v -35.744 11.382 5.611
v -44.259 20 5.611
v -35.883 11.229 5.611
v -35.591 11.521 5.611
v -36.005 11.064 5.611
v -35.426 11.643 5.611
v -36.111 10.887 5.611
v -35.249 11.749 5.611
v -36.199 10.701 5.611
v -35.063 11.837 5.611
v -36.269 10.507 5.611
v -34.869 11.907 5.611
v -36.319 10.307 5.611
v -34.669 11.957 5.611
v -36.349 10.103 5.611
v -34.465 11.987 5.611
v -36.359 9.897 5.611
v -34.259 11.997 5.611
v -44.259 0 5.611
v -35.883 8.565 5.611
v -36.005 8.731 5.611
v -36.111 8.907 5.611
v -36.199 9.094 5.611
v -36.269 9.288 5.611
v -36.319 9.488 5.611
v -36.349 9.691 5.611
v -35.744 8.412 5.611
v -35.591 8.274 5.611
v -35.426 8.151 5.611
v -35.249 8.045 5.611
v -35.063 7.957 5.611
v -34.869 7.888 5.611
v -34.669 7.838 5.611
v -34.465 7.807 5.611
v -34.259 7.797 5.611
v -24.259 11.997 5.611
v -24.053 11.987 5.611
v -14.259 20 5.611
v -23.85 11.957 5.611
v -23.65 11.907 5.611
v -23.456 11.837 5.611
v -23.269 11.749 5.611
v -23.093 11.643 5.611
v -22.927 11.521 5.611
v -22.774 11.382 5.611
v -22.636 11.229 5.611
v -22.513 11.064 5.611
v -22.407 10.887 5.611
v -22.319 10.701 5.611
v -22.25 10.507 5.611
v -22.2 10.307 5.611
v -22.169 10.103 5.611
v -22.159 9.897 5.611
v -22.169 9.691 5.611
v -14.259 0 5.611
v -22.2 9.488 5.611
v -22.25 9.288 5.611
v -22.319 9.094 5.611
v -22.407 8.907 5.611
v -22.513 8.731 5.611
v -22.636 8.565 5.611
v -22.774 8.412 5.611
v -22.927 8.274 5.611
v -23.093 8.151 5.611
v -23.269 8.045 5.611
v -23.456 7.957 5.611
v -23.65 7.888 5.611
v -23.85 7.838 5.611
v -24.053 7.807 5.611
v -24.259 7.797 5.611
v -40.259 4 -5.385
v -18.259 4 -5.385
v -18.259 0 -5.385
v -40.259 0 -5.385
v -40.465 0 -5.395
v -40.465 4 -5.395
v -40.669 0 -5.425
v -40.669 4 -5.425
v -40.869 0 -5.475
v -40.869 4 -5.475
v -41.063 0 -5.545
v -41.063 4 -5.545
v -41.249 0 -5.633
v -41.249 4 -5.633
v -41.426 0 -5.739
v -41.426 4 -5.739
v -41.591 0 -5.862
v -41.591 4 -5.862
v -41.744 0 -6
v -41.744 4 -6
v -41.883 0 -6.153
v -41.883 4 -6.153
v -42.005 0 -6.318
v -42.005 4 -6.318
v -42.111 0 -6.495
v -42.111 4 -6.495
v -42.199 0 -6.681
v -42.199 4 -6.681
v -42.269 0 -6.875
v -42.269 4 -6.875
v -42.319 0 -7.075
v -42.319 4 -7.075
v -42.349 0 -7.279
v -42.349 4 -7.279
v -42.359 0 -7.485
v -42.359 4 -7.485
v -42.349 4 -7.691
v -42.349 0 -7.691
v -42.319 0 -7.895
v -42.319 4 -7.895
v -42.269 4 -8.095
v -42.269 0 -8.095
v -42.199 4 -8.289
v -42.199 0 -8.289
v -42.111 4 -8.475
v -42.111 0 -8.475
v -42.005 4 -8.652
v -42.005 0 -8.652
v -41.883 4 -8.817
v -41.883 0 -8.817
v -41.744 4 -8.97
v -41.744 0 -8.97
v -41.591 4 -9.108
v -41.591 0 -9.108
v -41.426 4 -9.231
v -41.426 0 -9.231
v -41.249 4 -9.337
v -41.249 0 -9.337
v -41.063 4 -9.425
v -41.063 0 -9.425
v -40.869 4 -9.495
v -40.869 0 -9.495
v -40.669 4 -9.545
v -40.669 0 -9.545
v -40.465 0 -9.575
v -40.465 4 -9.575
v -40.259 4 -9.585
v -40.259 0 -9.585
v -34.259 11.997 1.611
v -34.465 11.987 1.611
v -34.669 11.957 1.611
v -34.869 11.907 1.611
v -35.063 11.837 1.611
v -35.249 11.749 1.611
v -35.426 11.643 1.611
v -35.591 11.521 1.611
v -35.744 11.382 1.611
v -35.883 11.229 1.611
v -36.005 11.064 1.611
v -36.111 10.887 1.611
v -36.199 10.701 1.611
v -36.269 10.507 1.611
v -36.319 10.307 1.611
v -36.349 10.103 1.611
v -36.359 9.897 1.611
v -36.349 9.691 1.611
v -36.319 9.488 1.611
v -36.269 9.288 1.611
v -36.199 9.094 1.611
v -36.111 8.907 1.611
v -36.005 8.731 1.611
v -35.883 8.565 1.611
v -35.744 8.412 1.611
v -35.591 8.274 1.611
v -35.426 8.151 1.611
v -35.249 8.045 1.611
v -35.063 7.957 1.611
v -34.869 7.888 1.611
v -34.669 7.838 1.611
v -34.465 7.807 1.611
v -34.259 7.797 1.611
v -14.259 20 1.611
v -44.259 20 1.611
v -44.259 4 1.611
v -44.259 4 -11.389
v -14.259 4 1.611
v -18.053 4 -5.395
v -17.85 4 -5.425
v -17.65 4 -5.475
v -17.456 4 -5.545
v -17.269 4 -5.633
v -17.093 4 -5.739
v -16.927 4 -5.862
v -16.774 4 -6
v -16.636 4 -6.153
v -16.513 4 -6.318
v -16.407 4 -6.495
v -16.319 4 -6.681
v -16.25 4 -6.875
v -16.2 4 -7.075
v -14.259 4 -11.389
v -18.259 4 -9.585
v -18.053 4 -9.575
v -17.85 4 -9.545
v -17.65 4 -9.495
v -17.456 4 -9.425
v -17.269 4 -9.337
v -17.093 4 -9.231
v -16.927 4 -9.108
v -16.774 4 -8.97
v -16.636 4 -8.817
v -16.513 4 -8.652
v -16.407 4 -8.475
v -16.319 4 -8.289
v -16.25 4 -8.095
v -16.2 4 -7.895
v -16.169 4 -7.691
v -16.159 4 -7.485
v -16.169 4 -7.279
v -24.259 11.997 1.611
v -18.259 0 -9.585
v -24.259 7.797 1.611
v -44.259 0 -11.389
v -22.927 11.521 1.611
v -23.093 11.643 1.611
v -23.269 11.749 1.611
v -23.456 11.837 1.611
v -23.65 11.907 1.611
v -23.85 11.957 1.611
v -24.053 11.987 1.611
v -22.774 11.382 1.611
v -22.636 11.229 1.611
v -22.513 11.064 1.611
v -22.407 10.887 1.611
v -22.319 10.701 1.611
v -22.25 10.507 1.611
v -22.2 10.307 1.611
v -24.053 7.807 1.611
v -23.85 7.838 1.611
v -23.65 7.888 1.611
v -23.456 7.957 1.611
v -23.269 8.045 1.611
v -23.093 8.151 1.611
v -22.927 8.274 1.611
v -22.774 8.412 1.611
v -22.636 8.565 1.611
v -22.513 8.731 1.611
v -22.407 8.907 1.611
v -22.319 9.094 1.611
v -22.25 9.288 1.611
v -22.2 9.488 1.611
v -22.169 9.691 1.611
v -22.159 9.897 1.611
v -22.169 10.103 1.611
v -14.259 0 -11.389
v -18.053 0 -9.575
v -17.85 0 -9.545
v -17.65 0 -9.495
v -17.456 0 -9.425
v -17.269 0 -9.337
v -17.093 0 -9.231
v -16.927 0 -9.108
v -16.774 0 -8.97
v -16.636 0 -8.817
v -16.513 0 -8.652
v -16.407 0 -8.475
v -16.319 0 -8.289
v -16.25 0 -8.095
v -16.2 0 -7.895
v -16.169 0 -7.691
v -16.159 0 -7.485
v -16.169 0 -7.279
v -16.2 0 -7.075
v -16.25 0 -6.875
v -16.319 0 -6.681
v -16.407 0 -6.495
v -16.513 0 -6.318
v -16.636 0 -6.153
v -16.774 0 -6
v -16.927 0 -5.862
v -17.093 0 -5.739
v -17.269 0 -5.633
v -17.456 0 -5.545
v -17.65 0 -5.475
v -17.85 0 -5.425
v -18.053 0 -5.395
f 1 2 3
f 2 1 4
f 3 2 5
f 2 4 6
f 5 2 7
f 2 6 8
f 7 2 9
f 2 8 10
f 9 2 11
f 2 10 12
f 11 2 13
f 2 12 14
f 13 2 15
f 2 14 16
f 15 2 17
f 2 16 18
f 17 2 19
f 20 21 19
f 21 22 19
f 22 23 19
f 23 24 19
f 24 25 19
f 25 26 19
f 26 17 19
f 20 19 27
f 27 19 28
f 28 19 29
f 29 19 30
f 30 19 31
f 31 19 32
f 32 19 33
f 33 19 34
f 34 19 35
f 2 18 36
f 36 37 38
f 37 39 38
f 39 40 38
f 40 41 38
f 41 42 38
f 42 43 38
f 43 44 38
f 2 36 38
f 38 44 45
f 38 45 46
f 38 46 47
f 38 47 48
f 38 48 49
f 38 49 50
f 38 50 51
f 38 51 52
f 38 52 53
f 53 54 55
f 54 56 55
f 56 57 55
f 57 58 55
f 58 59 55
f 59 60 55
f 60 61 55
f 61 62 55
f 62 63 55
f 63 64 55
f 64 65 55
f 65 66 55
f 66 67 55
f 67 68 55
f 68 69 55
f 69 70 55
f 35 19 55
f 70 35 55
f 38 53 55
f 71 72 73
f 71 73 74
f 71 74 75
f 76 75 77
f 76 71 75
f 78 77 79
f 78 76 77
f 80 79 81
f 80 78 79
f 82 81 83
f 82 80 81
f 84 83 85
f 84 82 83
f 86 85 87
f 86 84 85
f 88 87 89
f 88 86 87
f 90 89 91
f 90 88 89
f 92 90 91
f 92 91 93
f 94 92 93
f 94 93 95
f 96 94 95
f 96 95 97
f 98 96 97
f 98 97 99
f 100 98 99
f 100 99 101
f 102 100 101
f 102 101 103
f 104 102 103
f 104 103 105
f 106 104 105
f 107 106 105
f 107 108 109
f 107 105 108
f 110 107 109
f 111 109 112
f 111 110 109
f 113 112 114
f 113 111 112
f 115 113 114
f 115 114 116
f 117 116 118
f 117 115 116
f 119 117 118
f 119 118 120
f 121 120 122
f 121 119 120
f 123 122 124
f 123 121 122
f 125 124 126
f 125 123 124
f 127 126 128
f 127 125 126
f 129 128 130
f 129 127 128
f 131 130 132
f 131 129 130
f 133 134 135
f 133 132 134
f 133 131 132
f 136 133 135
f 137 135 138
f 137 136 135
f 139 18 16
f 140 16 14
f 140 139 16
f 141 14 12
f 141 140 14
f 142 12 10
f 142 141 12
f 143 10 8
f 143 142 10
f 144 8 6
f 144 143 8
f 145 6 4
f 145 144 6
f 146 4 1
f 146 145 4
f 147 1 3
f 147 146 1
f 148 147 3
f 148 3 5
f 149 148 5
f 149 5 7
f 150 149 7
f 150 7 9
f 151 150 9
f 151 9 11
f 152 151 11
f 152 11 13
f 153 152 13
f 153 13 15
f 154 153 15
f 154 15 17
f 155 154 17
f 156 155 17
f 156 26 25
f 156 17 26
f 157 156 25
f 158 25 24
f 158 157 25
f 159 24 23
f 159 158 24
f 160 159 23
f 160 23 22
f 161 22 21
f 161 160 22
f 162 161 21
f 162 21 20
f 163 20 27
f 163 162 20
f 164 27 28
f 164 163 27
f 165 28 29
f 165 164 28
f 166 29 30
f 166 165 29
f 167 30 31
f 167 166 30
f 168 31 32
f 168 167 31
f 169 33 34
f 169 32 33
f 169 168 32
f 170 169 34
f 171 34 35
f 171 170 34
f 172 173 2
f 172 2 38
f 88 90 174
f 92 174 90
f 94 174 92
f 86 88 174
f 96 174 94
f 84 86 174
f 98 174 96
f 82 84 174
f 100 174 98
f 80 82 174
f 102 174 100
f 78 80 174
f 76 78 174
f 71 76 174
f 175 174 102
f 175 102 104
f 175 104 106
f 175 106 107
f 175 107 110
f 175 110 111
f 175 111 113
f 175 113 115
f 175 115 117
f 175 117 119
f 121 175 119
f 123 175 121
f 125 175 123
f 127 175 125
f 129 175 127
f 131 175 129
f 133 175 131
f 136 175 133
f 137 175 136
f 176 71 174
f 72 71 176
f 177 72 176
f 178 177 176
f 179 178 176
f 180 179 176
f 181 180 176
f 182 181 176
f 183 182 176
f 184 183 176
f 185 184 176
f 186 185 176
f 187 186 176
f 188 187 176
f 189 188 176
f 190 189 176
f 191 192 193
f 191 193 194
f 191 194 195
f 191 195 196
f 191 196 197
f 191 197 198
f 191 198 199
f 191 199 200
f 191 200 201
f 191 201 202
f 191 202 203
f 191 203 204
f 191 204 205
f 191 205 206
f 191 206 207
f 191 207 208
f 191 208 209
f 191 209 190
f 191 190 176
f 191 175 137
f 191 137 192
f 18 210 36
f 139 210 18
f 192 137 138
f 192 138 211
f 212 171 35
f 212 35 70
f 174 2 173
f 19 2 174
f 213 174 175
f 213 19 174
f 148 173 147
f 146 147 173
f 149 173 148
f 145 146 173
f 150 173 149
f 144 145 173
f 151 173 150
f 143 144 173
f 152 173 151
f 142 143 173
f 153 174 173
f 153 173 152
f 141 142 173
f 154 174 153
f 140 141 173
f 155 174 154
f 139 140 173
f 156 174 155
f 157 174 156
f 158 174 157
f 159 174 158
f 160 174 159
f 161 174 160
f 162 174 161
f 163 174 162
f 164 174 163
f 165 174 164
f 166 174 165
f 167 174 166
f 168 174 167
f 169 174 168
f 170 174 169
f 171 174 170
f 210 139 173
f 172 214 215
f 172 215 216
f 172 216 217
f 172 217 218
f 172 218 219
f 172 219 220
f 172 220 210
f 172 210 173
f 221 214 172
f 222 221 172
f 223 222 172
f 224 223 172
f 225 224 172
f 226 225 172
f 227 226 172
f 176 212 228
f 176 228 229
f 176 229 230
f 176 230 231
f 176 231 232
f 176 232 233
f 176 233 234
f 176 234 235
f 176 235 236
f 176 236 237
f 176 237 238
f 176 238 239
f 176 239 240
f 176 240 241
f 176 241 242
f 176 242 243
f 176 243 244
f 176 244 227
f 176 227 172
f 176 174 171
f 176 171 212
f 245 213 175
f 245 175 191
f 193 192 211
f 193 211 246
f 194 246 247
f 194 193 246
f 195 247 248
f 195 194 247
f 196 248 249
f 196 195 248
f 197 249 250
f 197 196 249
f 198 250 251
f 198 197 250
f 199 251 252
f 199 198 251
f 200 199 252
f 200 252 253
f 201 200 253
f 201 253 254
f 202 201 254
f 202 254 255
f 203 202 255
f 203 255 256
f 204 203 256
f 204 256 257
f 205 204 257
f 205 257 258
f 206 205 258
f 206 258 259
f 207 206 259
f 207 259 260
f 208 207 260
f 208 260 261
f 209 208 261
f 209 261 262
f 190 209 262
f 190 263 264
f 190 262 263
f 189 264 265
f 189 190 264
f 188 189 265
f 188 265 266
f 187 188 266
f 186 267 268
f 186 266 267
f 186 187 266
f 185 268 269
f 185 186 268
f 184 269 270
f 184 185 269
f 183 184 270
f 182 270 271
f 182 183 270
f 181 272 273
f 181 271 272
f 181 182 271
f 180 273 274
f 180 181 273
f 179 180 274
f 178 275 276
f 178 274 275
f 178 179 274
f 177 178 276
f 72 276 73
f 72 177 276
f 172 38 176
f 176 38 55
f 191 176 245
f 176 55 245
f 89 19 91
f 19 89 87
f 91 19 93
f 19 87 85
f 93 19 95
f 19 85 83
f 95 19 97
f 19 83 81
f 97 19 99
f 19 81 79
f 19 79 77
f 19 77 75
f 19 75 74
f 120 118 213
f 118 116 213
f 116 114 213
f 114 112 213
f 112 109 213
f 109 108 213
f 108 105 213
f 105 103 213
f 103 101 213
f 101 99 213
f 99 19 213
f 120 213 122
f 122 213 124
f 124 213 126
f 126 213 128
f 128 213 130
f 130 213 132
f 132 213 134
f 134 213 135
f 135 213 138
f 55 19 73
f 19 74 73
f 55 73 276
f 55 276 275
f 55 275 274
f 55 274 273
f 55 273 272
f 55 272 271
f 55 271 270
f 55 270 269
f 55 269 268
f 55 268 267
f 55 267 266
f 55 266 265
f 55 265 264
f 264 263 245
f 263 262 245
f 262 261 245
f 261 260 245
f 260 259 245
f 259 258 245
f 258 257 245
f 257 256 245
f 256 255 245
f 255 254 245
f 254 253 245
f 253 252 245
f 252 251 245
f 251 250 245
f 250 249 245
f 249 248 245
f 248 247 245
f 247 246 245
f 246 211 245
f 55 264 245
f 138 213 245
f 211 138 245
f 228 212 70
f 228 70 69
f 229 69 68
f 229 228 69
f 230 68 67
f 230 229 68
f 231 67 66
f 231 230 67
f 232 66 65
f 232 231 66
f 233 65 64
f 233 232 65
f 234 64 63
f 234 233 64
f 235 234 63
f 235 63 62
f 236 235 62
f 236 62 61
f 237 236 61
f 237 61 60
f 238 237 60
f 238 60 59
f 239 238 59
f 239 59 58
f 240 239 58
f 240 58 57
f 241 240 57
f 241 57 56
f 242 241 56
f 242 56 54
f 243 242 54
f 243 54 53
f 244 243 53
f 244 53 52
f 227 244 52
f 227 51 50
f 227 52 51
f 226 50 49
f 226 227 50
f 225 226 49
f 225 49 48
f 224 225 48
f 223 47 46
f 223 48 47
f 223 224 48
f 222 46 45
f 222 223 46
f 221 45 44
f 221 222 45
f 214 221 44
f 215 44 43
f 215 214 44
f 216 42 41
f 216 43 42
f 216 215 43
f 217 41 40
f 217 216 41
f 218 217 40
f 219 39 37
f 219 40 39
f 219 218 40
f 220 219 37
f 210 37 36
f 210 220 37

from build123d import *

# Parameters (mm, degrees)
SKETCH1_W           = 30
SKETCH1_H           = 17
BOSS_EXTRUDE1_DEPTH = 4
SKETCH5_W           = 30
SKETCH5_H           = 4
BOSS_EXTRUDE2_DEPTH = 16
CUT_EXTRUDE3_DEPTH  = 10
CUT_EXTRUDE5_DEPTH  = 10


with BuildPart() as part:
    # Sketch1 → Boss-Extrude1 (new body)
    with BuildSketch(Plane(origin=(0, 0, 0), x_dir=(1, 0, 0), z_dir=(0, 1, 0))):
        with Locations((-29.259259259, 2.888888889)):
            Rectangle(SKETCH1_W, SKETCH1_H)
    extrude(amount=BOSS_EXTRUDE1_DEPTH)

    # Sketch5 → Boss-Extrude2 (add)
    with BuildSketch(Plane(origin=(0, 4, 0), x_dir=(1, 0, 0), z_dir=(0, 1, 0))):
        with Locations((-29.259259259, -3.611111111)):
            Rectangle(SKETCH5_W, SKETCH5_H)
    extrude(amount=BOSS_EXTRUDE2_DEPTH)

    # Sketch7 → Cut-Extrude3 (cut)
    with BuildSketch(Plane(origin=(0, 4, 0), x_dir=(1, 0, 0), z_dir=(0, 1, 0))):
        with BuildLine():
            Line((-18.259259259, 5.384968307), (-40.259259259, 5.384968307))
            ThreePointArc((-40.259259259, 5.384968307), (-42.359259259, 7.484968307), (-40.259259259, 9.584968307))
            Line((-40.259259259, 9.584968307), (-18.259259259, 9.584968307))
            ThreePointArc((-18.259259259, 9.584968307), (-16.159259259, 7.484968307), (-18.259259259, 5.384968307))
        make_face()
    extrude(amount=-CUT_EXTRUDE3_DEPTH, mode=Mode.SUBTRACT)

    # Sketch8 → Cut-Extrude5 (cut)
    with BuildSketch(Plane(origin=(0, 0, 1.611111111), x_dir=(-1, 0, 0), z_dir=(0, 0, -1))):
        with BuildLine():
            Line((24.259259259, 11.997218425), (34.259259259, 11.997218425))
            ThreePointArc((34.259259259, 11.997218425), (36.359259259, 9.897218425), (34.259259259, 7.797218425))
            Line((34.259259259, 7.797218425), (24.259259259, 7.797218425))
            ThreePointArc((24.259259259, 7.797218425), (22.159259259, 9.897218425), (24.259259259, 11.997218425))
        make_face()
    extrude(amount=-CUT_EXTRUDE5_DEPTH, mode=Mode.SUBTRACT)


solid = part.part
